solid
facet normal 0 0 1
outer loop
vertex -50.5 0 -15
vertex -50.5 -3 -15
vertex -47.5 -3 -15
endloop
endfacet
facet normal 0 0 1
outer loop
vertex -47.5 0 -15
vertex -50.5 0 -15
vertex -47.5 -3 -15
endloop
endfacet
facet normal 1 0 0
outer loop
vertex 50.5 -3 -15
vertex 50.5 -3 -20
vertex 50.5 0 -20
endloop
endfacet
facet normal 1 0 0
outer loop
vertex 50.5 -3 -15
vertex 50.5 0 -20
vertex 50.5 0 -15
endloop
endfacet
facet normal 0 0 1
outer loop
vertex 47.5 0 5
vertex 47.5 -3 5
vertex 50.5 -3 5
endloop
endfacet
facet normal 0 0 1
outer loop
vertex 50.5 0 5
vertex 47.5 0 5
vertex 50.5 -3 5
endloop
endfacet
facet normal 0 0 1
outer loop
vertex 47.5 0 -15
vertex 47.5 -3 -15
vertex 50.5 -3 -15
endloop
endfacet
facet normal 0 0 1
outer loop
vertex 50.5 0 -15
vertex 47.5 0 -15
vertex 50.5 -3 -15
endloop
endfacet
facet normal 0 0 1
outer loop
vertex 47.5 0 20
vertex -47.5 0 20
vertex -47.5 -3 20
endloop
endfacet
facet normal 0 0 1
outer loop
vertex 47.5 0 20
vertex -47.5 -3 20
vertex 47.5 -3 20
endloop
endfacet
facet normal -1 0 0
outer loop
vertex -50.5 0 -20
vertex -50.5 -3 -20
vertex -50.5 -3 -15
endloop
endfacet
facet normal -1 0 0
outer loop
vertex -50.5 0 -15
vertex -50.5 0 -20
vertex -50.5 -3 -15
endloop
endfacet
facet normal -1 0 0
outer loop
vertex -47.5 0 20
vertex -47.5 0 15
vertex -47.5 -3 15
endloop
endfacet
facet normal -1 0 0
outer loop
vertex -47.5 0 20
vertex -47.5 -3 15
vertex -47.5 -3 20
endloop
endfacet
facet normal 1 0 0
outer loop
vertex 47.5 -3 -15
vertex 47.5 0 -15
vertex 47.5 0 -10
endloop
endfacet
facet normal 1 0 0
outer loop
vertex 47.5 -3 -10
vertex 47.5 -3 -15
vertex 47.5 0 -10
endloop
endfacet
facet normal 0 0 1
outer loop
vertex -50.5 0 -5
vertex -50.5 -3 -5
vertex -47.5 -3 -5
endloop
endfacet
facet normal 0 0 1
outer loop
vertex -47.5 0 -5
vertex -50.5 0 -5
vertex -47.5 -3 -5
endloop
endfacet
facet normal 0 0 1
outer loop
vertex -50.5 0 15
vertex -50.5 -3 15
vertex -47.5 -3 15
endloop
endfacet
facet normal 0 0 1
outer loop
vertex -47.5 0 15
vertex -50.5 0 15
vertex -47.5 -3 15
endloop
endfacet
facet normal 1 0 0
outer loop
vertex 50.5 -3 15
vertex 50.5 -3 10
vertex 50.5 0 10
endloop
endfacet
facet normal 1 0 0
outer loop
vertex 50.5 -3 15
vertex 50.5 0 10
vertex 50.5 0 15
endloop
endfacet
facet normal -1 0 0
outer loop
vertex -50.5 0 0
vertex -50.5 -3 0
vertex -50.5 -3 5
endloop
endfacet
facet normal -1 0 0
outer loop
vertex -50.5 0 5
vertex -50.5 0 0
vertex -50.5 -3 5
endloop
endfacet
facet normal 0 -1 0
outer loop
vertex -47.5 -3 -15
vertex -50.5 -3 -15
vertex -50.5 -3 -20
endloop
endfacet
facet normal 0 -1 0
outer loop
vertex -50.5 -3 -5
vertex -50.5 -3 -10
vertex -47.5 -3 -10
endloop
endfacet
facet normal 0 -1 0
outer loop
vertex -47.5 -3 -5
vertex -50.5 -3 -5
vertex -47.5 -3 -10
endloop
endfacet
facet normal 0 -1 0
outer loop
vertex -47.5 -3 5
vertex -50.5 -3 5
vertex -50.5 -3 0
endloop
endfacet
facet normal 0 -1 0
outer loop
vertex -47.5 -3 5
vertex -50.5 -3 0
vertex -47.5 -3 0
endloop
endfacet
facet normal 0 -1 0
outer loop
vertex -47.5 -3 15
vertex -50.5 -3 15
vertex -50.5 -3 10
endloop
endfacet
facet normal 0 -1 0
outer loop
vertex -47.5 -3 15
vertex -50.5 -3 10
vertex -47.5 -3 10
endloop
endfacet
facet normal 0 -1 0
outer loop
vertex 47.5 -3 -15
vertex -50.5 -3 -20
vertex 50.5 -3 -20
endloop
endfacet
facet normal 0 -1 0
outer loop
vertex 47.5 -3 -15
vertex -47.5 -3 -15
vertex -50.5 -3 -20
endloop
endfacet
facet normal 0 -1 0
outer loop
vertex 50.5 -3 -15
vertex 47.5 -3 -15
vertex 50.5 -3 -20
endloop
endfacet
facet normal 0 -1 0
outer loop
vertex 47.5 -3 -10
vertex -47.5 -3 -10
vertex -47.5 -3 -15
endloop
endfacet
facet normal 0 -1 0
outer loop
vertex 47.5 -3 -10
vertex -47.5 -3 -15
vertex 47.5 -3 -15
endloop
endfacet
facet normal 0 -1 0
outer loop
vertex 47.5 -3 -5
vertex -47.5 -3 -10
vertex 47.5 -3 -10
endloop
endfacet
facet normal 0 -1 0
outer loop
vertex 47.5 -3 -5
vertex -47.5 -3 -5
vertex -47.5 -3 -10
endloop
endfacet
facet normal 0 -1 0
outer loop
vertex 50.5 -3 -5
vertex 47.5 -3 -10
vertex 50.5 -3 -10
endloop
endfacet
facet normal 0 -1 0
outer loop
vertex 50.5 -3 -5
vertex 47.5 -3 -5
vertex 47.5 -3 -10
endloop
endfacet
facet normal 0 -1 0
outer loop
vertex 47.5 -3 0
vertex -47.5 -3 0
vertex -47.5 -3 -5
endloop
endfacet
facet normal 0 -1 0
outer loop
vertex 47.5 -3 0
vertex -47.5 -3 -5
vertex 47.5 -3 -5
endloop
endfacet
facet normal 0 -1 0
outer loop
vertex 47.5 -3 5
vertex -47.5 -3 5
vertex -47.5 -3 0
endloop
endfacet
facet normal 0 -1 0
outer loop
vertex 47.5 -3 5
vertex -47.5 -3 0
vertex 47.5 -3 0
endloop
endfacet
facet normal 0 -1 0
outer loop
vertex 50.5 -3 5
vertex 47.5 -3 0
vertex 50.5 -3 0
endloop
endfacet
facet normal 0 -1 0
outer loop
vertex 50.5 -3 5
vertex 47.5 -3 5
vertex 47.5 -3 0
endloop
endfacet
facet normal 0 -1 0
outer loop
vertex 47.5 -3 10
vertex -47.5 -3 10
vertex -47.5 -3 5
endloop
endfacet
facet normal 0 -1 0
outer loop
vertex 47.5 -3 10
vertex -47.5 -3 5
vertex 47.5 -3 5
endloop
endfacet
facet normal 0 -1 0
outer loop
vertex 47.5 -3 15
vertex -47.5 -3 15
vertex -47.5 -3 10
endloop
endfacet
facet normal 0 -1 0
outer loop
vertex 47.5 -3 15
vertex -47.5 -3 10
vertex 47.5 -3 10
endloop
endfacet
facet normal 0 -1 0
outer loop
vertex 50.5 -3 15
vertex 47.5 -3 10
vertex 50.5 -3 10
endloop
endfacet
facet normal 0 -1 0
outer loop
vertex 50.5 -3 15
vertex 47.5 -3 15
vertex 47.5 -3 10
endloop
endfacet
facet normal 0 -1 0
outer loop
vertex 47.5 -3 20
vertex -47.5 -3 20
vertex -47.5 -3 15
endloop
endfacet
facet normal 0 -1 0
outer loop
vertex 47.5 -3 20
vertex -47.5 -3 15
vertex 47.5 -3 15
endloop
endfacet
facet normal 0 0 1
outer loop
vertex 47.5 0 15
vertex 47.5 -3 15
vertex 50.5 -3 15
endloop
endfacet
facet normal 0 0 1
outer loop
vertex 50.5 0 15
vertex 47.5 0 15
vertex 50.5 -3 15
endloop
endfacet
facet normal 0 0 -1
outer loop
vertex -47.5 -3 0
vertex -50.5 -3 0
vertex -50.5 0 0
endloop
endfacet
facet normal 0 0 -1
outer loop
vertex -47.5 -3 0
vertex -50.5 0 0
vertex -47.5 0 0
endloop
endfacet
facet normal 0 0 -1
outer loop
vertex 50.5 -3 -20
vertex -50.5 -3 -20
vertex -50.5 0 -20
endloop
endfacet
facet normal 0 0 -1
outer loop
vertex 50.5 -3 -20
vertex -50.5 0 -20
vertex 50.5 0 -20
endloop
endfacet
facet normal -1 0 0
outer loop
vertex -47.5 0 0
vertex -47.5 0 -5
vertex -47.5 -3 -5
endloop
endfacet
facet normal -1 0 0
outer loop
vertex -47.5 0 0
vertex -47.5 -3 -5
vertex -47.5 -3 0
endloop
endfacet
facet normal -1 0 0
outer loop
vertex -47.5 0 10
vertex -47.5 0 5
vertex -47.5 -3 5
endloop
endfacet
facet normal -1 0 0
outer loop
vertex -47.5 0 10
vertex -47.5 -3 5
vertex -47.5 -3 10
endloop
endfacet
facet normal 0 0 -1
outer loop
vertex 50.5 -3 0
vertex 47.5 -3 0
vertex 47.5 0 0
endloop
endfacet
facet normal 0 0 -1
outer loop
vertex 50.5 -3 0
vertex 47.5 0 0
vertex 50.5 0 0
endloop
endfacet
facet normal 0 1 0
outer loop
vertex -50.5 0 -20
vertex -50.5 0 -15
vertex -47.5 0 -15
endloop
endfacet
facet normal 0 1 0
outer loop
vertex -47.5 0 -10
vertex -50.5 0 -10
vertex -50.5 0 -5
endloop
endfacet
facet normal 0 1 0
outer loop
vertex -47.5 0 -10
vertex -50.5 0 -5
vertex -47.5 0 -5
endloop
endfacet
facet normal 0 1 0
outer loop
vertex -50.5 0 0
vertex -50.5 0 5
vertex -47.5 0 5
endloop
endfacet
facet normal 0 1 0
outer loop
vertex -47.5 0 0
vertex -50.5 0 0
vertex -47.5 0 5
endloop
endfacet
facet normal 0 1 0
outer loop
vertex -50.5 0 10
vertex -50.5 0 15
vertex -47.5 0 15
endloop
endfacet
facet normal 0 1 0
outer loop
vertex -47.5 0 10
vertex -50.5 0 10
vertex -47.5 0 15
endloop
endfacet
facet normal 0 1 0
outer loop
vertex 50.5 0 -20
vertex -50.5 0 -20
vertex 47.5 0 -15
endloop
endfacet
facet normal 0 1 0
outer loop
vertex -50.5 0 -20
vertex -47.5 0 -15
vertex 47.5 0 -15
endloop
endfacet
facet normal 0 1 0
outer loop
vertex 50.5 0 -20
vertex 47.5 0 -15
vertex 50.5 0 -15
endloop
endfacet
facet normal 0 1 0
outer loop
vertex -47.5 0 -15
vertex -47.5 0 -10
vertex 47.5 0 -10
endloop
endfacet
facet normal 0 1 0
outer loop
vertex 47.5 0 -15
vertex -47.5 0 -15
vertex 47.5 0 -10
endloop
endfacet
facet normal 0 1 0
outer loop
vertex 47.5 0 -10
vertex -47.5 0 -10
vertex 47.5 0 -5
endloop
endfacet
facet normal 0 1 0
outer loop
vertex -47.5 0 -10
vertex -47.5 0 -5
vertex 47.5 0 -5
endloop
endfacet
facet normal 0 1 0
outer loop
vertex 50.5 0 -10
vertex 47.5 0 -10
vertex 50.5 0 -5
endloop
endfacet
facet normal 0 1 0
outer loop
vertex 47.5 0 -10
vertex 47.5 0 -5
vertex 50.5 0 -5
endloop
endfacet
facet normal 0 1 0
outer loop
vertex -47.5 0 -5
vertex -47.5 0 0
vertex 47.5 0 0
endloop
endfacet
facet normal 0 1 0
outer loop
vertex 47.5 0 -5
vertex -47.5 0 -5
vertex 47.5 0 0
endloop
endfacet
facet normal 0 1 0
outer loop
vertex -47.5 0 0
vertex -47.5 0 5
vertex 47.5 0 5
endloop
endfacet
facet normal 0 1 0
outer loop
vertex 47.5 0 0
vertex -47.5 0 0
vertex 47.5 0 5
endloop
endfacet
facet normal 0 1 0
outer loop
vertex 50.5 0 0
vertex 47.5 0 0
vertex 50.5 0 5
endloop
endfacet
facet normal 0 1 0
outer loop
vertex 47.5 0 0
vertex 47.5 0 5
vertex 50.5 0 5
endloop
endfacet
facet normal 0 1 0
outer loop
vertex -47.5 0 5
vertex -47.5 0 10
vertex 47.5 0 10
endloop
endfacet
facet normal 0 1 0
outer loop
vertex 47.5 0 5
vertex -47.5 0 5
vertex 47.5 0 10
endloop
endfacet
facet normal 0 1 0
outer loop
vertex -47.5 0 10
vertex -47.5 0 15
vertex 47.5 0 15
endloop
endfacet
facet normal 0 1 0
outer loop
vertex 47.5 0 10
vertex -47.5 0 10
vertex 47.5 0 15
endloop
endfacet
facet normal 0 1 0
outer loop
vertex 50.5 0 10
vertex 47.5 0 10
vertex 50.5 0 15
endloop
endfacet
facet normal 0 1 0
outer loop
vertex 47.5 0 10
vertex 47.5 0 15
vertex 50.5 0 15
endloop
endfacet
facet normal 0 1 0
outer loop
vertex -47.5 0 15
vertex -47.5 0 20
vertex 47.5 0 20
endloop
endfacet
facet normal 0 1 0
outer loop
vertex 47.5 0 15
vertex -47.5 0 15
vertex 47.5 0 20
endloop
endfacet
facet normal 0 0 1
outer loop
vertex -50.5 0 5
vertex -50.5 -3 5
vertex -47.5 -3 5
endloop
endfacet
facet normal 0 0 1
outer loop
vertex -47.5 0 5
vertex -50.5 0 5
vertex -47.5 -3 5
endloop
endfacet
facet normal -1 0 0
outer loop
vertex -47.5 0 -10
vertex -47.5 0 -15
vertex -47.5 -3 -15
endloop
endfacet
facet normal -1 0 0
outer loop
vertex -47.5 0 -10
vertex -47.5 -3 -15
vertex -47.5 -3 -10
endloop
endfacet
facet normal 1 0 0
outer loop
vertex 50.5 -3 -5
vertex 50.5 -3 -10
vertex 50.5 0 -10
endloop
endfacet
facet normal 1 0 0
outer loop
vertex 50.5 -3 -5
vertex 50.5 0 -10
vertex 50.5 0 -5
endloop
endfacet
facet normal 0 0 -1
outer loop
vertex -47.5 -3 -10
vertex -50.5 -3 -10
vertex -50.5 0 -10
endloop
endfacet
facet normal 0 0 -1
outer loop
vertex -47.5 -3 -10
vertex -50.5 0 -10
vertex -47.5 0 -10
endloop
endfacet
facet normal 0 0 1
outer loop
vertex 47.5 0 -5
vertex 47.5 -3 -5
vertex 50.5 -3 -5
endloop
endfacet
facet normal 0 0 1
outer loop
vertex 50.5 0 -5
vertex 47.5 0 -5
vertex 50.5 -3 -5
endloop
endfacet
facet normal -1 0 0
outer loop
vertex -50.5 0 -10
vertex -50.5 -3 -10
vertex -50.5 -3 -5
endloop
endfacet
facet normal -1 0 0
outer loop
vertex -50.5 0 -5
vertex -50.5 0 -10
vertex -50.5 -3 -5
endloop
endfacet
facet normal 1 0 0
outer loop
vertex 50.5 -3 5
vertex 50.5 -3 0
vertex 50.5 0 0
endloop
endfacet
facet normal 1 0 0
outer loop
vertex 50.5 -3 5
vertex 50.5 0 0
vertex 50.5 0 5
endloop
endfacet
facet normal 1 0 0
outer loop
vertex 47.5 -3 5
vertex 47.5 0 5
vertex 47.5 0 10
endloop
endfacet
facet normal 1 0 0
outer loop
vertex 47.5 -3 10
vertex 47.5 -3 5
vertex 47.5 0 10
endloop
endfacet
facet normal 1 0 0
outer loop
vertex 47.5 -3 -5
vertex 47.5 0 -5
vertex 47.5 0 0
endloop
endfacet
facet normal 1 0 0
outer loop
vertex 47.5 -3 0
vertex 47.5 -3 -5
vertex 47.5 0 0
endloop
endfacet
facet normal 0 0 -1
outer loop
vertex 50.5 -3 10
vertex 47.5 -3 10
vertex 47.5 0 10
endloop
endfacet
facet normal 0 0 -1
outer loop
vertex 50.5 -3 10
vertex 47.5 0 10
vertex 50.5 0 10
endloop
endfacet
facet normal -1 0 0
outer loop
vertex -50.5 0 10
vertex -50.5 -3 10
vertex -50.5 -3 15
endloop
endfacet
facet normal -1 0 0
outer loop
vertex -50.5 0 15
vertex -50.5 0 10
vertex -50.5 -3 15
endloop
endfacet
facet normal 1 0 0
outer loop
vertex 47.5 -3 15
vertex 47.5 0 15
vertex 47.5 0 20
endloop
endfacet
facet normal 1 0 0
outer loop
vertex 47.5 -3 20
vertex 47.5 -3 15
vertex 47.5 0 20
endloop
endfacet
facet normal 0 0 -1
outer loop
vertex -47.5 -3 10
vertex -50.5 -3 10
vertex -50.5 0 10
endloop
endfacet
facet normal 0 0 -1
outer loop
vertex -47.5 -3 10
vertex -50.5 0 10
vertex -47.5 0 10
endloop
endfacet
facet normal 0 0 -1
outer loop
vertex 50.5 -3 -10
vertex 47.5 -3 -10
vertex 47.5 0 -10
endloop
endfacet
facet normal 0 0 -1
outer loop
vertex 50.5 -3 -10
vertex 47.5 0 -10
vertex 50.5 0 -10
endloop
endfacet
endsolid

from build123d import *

# Parameters (mm, degrees)
F0_W     = 95
F0_H     = 40
F1_DEPTH = 3
F2_W     = 3
F2_H     = 5
F3_DEPTH = 3


# Not quite as in the source:
# - a feature names something its author has since deleted; it is built from what else it names


with BuildPart() as f1:
    # F0 (on Front) → F1 (new body)
    with BuildSketch(Plane.XZ):
        Rectangle(F0_W, F0_H)
    extrude(amount=F1_DEPTH)

    # F2 (on face) → F3 (join)
    with BuildSketch(Plane.XZ.offset(3)):
        with Locations((-49, -17.5)):
            Rectangle(F2_W, F2_H)
        with Locations((-49, -7.5)):
            Rectangle(F2_W, F2_H)
        with Locations((-49, 2.5)):
            Rectangle(F2_W, F2_H)
        with Locations((-49, 12.5)):
            Rectangle(F2_W, F2_H)
        with Locations((49, -7.5)):
            Rectangle(F2_W, F2_H)
        with Locations((49, -17.5)):
            Rectangle(F2_W, F2_H)
        with Locations((49, 12.5)):
            Rectangle(F2_W, F2_H)
        with Locations((49, 2.5)):
            Rectangle(F2_W, F2_H)
    extrude(amount=-F3_DEPTH)


solid = f1.part
